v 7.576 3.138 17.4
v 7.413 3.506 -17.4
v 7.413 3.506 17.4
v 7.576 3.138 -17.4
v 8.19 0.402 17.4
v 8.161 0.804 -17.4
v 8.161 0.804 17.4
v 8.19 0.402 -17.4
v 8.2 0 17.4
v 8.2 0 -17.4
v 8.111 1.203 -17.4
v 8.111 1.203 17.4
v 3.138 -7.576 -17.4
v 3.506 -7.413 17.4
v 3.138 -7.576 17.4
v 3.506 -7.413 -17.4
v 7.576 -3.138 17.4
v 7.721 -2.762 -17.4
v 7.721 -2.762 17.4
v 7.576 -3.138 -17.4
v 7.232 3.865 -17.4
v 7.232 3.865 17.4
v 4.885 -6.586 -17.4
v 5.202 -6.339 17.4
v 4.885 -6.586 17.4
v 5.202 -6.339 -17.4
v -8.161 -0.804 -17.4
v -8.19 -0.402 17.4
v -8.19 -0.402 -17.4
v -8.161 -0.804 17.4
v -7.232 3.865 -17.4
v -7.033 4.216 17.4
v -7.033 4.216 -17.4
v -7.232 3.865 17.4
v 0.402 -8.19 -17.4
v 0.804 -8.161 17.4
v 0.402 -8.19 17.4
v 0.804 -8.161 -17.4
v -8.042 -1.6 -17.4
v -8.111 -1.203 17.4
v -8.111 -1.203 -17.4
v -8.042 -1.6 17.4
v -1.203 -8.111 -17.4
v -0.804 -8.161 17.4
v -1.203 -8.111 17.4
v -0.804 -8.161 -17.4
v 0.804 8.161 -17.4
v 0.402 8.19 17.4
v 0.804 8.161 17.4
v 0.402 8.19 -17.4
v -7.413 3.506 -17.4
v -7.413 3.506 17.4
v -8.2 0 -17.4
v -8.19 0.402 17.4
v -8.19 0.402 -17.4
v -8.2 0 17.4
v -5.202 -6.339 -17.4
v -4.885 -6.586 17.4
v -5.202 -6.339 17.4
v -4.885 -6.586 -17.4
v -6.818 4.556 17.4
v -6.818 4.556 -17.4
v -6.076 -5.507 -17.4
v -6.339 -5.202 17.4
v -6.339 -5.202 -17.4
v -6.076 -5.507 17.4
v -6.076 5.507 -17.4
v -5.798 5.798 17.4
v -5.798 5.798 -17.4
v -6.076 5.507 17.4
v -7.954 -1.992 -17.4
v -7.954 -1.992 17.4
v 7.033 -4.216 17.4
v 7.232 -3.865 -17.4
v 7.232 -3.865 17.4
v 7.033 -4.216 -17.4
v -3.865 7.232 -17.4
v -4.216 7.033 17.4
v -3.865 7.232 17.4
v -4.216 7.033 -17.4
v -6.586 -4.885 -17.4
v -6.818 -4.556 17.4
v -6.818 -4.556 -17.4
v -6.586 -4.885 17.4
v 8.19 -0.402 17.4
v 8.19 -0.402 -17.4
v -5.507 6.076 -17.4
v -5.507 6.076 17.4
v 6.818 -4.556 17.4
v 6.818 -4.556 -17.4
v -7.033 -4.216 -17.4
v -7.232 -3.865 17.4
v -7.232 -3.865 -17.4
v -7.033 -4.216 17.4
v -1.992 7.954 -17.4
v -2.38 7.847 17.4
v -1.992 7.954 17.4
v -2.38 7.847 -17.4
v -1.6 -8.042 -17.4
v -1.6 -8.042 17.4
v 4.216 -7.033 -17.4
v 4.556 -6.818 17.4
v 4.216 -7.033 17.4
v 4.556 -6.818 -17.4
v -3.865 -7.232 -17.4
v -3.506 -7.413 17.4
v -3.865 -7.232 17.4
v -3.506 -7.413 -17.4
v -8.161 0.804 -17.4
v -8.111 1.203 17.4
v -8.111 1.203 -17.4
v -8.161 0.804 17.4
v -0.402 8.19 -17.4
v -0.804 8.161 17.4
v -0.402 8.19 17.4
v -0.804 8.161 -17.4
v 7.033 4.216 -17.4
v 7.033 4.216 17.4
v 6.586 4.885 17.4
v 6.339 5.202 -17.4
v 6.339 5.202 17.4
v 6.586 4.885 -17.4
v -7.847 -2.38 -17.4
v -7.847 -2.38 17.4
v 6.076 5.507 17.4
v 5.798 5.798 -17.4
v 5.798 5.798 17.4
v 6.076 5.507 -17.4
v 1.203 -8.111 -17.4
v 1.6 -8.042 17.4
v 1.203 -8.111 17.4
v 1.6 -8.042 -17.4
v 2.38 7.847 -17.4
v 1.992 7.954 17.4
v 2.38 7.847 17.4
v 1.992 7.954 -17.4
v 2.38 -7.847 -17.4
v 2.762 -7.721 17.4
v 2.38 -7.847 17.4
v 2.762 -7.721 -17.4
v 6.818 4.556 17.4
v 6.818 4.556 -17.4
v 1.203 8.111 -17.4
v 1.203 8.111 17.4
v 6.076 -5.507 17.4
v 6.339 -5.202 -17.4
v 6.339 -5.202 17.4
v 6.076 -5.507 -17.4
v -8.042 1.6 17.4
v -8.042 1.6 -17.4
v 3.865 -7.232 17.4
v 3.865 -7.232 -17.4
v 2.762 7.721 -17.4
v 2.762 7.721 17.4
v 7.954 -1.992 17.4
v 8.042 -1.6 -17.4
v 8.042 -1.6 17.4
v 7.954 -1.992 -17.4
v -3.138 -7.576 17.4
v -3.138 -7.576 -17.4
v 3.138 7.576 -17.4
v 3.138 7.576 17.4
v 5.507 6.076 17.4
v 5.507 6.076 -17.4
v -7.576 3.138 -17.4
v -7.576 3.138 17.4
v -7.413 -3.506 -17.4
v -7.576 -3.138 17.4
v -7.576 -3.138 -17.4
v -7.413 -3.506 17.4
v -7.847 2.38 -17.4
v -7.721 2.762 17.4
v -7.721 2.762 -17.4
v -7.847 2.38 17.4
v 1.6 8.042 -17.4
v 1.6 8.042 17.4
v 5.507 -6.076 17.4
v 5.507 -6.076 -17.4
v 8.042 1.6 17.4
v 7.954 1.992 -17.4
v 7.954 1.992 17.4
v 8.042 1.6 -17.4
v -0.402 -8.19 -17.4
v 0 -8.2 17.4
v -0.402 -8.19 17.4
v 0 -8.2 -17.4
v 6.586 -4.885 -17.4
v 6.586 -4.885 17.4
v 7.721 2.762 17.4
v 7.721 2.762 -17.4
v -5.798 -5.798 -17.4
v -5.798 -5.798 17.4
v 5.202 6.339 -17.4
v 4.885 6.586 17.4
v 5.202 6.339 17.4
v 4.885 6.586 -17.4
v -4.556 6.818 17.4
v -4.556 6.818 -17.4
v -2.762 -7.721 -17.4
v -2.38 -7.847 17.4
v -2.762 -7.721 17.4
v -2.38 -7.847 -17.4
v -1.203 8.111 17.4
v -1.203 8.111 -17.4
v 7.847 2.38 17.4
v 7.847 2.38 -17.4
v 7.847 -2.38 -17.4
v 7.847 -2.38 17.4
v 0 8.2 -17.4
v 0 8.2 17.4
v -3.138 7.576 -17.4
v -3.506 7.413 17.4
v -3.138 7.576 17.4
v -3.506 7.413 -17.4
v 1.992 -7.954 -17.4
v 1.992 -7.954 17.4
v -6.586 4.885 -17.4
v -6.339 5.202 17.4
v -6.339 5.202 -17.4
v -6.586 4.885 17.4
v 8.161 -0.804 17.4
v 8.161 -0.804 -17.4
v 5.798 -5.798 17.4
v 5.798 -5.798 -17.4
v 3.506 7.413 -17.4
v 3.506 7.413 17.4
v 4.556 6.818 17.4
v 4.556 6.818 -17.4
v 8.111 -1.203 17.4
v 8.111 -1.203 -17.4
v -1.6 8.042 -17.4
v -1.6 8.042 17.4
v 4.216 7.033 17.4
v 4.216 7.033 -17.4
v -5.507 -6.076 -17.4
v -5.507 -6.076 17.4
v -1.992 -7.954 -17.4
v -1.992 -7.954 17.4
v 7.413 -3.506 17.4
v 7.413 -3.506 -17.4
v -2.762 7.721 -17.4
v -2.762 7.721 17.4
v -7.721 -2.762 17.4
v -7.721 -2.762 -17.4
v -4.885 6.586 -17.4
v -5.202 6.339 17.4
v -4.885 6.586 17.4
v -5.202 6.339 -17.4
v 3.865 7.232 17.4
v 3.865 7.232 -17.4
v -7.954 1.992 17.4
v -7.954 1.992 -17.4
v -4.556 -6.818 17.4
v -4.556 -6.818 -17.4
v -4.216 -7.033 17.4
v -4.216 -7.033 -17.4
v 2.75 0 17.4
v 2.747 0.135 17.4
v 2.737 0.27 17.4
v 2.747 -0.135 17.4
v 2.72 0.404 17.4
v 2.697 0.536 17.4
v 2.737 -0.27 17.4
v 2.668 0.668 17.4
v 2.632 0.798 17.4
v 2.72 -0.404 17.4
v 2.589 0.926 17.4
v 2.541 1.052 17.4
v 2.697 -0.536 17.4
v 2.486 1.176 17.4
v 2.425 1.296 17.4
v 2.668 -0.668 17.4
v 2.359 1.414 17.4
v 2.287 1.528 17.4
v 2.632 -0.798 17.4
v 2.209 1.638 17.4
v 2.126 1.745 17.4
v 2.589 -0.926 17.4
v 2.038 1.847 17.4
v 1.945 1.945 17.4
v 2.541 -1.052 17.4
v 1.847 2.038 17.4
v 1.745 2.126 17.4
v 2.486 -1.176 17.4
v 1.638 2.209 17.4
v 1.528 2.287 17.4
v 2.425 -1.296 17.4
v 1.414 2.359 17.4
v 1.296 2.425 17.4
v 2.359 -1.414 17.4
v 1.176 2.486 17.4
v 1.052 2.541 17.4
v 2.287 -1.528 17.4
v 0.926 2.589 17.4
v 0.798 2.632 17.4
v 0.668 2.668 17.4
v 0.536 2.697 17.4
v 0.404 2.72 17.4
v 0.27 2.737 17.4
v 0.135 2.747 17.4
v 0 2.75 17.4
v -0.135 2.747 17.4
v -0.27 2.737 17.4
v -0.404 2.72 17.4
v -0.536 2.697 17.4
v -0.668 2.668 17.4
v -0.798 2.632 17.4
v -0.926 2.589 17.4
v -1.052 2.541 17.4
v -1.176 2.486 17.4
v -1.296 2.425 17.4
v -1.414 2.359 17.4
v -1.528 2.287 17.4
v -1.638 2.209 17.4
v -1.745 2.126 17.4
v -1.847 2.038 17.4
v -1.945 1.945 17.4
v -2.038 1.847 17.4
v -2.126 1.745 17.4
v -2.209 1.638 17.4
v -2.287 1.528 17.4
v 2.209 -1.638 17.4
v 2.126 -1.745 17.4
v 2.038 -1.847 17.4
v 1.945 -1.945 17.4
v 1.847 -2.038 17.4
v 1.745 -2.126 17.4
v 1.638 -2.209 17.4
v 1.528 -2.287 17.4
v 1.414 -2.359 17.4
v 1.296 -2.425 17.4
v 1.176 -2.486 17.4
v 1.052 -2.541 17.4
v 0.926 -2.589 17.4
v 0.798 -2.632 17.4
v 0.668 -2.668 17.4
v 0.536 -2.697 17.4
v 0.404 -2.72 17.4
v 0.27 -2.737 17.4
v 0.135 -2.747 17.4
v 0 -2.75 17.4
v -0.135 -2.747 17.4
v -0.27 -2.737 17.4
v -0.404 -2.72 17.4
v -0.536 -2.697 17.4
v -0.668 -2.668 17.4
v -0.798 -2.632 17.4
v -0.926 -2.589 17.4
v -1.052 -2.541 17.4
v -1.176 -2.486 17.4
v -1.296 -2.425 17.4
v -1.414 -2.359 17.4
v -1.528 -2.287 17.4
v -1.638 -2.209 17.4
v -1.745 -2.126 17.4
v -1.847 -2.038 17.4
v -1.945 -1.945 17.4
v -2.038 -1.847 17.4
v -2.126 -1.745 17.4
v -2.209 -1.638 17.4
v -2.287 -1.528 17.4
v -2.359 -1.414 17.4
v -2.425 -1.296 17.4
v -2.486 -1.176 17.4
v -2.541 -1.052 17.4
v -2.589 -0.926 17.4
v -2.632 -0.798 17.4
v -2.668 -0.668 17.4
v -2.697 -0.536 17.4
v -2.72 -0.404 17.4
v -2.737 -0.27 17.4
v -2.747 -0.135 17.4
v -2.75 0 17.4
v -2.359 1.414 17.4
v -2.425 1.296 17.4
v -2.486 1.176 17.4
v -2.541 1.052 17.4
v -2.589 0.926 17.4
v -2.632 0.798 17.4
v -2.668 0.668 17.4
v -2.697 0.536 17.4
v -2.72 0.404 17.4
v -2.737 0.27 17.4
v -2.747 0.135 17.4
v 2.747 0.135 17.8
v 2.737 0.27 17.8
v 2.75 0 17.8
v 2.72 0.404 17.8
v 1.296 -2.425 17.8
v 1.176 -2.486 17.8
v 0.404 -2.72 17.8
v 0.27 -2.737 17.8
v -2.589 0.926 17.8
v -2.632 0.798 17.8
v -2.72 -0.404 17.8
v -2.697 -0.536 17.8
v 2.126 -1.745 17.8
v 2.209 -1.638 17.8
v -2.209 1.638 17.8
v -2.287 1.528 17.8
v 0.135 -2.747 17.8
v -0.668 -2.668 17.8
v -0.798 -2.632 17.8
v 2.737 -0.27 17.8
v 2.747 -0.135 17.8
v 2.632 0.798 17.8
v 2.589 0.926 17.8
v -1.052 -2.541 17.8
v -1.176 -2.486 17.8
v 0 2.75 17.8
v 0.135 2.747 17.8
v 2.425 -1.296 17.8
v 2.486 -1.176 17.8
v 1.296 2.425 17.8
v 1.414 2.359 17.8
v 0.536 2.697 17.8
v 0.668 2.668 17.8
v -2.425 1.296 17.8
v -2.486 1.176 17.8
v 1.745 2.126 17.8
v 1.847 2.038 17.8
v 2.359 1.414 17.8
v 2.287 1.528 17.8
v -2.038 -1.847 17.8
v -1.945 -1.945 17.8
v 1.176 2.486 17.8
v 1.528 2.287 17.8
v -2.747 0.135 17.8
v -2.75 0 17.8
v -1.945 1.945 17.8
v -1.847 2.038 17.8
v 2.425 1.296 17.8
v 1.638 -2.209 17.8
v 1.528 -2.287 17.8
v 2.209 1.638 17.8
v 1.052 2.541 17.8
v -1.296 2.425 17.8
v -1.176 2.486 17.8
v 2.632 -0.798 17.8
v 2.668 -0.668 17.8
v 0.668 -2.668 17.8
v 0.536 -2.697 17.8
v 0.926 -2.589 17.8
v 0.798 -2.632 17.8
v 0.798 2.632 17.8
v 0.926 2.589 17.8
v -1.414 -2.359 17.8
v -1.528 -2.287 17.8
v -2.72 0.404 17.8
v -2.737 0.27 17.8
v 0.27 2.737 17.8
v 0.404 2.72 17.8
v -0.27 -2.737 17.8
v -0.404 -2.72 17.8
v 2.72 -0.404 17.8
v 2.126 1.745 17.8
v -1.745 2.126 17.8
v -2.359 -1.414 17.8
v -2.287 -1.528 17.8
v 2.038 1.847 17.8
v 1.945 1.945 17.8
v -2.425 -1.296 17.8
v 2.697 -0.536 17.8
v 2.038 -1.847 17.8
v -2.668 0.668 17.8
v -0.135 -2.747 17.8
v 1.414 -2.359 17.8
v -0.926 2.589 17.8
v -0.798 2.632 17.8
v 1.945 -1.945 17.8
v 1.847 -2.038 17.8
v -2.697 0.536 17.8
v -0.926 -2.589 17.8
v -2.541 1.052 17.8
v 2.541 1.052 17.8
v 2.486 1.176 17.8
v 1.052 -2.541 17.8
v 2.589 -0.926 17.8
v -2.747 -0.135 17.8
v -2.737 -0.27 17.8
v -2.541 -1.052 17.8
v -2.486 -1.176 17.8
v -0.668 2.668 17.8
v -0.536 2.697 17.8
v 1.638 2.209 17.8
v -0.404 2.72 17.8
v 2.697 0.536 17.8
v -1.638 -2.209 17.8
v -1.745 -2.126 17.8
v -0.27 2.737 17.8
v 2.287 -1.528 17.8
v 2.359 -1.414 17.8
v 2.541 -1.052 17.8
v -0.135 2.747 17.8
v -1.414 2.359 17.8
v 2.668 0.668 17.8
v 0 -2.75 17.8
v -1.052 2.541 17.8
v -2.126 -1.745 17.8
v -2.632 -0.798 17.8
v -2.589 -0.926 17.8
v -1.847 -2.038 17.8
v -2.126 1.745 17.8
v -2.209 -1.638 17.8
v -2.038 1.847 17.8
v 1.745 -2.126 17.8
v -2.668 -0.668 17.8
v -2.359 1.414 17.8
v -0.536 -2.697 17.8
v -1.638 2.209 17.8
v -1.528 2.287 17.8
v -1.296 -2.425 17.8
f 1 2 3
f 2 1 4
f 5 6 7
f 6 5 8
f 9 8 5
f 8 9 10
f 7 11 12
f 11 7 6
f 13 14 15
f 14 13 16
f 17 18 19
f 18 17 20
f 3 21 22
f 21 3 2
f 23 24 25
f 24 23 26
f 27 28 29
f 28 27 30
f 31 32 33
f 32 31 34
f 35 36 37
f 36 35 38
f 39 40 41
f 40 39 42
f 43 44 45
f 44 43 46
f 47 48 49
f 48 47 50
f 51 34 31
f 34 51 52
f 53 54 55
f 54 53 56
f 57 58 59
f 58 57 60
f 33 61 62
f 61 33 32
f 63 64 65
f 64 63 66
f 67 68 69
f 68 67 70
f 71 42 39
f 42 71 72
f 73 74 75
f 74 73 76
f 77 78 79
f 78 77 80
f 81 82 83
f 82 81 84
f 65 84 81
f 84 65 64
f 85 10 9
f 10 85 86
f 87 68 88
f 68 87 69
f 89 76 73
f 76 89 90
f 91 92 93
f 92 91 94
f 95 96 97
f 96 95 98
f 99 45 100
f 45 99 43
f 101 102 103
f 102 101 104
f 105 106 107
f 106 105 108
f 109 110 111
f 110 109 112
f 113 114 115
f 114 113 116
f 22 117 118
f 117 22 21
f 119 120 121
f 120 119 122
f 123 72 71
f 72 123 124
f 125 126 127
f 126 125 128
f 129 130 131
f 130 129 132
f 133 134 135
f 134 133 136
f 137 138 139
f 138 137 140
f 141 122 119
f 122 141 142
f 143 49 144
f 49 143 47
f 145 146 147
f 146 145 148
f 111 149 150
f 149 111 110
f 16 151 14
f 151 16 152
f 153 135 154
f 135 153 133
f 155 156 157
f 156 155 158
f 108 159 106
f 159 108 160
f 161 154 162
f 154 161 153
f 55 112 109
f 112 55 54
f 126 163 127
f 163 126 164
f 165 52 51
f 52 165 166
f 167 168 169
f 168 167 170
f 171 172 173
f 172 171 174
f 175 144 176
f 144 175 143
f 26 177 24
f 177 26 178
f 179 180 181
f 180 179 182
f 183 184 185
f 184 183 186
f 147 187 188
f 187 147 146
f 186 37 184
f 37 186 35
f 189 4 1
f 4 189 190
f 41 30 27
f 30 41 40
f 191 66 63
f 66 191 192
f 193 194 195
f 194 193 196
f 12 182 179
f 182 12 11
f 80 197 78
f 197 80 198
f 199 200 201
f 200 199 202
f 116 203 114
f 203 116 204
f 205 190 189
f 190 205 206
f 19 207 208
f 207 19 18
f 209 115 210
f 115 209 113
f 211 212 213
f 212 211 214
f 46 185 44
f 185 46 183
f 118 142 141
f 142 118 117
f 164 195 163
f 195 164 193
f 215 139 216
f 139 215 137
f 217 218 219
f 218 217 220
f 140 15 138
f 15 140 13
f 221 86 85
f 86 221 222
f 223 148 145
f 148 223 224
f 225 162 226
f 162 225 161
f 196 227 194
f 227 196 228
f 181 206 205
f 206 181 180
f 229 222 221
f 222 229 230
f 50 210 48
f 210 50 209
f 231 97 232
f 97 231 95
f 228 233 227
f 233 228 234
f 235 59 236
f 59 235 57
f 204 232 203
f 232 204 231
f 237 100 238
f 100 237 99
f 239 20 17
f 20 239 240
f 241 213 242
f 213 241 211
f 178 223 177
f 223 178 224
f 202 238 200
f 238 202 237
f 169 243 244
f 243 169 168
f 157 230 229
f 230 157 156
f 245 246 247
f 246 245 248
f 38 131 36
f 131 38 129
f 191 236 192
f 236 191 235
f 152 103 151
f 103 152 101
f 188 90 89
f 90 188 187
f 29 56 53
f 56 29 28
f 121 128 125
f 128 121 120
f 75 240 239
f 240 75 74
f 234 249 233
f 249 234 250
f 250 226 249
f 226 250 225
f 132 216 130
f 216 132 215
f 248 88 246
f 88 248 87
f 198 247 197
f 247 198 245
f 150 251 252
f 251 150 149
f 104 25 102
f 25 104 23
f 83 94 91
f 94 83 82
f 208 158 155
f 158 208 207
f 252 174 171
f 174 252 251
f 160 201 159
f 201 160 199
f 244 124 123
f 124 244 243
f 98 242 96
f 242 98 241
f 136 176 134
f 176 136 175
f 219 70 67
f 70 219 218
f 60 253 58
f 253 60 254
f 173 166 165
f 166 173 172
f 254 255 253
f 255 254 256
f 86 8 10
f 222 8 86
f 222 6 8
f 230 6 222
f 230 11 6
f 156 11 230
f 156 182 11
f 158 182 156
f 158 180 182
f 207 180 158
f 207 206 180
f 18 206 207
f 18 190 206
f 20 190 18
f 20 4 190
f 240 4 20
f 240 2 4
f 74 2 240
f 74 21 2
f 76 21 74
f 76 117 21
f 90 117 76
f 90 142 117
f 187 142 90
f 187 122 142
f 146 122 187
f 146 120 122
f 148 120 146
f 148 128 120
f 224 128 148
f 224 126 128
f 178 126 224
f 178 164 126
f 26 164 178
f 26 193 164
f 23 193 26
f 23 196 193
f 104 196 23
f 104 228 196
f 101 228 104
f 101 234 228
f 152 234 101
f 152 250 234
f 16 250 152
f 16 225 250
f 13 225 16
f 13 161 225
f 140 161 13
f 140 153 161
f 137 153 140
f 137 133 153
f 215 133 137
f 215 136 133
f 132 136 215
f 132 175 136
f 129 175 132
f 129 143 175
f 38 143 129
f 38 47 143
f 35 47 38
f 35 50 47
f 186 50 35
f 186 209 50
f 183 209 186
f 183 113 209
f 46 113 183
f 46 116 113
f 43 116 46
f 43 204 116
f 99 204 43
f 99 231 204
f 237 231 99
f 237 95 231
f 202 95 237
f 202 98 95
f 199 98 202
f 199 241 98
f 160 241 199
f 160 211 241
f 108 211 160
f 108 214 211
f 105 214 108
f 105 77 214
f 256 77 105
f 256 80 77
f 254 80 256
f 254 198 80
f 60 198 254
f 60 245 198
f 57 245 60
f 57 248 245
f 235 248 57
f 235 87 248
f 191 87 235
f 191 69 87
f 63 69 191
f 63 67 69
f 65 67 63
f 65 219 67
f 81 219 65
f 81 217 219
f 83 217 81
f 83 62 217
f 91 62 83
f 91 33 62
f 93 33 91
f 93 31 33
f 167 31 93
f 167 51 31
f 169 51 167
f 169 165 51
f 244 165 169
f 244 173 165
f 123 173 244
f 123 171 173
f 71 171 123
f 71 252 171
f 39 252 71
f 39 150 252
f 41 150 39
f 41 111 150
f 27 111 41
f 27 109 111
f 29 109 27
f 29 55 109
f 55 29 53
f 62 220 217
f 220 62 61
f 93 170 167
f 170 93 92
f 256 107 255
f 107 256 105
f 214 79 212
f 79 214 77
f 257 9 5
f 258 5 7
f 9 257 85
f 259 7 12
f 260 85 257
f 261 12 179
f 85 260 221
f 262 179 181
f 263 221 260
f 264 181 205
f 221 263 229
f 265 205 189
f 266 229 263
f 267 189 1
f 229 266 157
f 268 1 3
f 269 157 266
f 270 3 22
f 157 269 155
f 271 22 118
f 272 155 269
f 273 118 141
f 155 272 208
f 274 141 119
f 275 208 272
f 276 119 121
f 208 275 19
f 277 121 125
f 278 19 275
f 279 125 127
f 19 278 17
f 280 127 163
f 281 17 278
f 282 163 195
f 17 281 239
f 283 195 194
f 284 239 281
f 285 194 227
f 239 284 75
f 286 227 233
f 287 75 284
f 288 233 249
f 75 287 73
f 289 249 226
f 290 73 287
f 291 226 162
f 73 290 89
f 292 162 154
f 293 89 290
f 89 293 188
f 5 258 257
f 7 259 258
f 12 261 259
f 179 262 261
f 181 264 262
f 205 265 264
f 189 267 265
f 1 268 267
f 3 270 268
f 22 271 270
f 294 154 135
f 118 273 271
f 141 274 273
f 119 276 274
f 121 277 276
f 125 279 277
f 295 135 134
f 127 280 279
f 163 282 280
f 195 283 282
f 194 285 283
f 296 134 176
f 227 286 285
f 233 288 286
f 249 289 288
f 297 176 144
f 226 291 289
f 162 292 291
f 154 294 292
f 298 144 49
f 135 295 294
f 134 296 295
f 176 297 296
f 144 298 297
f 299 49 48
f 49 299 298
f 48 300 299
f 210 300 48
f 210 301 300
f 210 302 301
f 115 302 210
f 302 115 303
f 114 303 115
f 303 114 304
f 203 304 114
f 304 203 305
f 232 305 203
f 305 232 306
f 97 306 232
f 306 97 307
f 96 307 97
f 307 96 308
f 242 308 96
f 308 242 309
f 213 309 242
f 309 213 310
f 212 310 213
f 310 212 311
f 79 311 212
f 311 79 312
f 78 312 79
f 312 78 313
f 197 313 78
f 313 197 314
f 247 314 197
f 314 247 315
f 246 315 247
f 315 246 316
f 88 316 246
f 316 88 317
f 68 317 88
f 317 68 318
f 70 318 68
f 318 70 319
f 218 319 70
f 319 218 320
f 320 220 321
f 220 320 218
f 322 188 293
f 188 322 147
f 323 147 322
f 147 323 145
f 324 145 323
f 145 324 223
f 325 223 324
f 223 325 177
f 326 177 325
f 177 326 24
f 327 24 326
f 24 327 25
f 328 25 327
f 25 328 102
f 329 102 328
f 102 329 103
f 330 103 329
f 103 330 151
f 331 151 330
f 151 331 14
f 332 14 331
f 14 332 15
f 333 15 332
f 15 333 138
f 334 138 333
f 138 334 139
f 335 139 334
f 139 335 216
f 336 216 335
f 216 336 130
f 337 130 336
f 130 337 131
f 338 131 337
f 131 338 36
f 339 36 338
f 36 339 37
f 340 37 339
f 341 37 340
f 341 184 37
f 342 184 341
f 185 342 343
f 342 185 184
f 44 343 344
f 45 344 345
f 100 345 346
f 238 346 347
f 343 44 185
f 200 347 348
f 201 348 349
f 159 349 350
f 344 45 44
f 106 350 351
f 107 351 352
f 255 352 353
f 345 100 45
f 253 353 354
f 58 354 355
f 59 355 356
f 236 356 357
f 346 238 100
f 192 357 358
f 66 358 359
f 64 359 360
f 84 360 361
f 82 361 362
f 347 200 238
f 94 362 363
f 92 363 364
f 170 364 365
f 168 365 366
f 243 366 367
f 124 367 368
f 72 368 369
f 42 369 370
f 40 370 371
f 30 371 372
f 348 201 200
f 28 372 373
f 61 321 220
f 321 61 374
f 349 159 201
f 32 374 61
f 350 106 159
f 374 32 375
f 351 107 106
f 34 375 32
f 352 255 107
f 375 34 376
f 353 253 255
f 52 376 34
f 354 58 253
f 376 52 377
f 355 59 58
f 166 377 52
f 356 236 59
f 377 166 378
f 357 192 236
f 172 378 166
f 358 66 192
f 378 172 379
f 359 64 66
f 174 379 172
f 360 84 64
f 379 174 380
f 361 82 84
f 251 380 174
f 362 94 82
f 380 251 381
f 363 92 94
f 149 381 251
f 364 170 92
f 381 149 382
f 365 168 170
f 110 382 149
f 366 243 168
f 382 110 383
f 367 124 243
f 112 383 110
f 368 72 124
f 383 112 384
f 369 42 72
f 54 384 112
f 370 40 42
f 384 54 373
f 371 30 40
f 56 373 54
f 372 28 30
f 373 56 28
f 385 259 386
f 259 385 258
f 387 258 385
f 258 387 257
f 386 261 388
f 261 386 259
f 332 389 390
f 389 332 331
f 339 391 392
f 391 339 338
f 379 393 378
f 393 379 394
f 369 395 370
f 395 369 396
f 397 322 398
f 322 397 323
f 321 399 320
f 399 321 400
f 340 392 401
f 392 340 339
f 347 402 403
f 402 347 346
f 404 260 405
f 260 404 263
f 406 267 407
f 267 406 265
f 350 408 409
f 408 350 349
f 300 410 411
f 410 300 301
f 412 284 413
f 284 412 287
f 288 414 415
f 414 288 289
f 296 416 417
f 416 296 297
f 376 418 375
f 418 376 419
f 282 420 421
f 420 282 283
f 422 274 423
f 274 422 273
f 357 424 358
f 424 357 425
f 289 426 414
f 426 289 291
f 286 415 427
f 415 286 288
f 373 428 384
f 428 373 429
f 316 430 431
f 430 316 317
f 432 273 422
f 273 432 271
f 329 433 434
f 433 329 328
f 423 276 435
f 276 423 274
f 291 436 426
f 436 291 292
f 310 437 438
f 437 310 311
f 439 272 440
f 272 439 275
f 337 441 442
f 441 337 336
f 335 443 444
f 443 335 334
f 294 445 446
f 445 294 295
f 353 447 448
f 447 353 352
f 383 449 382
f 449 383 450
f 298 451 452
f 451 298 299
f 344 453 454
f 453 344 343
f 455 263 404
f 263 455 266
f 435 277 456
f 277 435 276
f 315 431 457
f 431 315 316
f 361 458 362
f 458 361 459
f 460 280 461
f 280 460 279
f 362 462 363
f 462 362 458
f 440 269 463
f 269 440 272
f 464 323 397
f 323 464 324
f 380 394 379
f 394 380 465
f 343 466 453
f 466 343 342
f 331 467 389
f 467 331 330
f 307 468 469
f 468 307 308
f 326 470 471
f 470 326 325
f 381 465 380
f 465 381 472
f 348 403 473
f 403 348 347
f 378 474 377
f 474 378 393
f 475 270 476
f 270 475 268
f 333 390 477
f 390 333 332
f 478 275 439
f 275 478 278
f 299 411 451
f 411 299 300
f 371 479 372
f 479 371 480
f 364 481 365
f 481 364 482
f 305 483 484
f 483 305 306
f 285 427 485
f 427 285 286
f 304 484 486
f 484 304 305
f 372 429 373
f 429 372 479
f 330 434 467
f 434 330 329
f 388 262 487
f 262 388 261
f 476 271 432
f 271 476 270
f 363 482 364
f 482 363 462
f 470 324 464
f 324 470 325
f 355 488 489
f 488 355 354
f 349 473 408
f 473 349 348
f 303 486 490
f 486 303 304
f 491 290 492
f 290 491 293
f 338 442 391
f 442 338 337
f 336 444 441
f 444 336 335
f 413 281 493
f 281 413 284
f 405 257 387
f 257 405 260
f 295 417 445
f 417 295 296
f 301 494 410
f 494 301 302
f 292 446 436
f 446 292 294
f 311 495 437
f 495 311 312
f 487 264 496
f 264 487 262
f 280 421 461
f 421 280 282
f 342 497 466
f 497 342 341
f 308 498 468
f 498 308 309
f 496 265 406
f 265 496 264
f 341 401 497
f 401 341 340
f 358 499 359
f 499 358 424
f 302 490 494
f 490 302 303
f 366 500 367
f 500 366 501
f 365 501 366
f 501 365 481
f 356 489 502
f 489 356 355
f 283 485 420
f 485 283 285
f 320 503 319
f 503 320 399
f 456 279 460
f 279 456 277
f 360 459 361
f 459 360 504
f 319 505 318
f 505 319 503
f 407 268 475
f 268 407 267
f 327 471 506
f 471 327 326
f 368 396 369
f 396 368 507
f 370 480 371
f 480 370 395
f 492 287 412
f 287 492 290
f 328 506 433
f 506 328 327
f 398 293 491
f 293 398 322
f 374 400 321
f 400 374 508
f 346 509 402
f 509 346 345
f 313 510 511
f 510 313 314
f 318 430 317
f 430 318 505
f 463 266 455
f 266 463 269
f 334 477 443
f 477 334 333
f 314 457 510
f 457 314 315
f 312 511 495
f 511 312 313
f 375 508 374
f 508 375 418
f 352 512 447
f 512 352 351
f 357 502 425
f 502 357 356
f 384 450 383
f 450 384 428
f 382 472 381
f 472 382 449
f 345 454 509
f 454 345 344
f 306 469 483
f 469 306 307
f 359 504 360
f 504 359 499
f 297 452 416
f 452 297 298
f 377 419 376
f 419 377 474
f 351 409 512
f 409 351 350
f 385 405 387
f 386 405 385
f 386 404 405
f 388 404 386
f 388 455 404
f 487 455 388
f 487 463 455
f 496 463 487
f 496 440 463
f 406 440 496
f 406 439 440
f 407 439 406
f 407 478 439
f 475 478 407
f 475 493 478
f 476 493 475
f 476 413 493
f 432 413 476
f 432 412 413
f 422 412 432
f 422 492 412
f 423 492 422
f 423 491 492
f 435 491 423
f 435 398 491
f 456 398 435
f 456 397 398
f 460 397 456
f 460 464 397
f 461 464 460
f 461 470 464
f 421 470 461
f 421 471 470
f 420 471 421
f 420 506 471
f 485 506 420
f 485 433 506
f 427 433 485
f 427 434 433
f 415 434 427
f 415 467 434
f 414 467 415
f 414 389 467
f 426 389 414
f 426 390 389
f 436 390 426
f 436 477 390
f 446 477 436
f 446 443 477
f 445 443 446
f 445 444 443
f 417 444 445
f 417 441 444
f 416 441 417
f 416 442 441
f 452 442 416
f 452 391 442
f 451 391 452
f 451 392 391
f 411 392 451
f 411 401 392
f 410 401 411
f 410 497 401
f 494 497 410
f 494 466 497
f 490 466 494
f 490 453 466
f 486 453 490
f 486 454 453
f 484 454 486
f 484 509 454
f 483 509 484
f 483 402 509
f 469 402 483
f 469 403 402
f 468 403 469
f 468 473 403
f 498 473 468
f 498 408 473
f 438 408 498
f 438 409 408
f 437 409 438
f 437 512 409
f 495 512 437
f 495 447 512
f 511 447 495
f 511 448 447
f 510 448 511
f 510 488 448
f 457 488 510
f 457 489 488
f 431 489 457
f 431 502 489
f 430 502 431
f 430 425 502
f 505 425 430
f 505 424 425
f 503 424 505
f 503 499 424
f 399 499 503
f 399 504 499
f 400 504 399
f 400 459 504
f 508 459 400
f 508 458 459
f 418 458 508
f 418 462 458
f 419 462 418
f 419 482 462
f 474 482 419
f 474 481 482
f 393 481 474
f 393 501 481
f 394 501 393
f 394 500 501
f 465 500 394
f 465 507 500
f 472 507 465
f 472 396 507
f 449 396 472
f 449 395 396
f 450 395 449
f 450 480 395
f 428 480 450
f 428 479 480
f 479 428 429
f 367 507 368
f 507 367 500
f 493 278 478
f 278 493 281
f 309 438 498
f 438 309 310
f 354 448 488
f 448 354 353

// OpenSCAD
// Battery cell: 35.2mm tall, 16.4mm diameter (one connected solid)

height_mm   = 35.2;   // total height including terminals
diameter_mm = 16.4;

positive_terminal_diameter_mm = 5.5;
positive_terminal_height_mm   = 1.2;

negative_terminal_diameter_mm = 8.0;
negative_terminal_height_mm   = 0.2;

terminal_overlap_mm = 0.8;   // overlap into body to guarantee connectivity

$fn = 128;

module battery() {
    body_r = diameter_mm/2;

    // Clamp overlap so it never exceeds each terminal height
    pos_ov = min(terminal_overlap_mm, positive_terminal_height_mm);
    neg_ov = min(terminal_overlap_mm, negative_terminal_height_mm);

    // Body height chosen so overall height remains exactly height_mm
    // while still allowing overlap (overlap adds material but not overall height).
    body_h = height_mm - positive_terminal_height_mm - negative_terminal_height_mm + pos_ov + neg_ov;

    union() {
        // Main cylindrical body
        cylinder(h=body_h, r=body_r, center=true);

        // Positive terminal (top), connected with overlap into body
        translate([0, 0, body_h/2 + positive_terminal_height_mm/2 - pos_ov])
            cylinder(h=positive_terminal_height_mm,
                     r=positive_terminal_diameter_mm/2,
                     center=true);

        // Negative terminal (bottom), connected with overlap into body
        translate([0, 0, -body_h/2 - negative_terminal_height_mm/2 + neg_ov])
            cylinder(h=negative_terminal_height_mm,
                     r=negative_terminal_diameter_mm/2,
                     center=true);
    }
}

battery();
